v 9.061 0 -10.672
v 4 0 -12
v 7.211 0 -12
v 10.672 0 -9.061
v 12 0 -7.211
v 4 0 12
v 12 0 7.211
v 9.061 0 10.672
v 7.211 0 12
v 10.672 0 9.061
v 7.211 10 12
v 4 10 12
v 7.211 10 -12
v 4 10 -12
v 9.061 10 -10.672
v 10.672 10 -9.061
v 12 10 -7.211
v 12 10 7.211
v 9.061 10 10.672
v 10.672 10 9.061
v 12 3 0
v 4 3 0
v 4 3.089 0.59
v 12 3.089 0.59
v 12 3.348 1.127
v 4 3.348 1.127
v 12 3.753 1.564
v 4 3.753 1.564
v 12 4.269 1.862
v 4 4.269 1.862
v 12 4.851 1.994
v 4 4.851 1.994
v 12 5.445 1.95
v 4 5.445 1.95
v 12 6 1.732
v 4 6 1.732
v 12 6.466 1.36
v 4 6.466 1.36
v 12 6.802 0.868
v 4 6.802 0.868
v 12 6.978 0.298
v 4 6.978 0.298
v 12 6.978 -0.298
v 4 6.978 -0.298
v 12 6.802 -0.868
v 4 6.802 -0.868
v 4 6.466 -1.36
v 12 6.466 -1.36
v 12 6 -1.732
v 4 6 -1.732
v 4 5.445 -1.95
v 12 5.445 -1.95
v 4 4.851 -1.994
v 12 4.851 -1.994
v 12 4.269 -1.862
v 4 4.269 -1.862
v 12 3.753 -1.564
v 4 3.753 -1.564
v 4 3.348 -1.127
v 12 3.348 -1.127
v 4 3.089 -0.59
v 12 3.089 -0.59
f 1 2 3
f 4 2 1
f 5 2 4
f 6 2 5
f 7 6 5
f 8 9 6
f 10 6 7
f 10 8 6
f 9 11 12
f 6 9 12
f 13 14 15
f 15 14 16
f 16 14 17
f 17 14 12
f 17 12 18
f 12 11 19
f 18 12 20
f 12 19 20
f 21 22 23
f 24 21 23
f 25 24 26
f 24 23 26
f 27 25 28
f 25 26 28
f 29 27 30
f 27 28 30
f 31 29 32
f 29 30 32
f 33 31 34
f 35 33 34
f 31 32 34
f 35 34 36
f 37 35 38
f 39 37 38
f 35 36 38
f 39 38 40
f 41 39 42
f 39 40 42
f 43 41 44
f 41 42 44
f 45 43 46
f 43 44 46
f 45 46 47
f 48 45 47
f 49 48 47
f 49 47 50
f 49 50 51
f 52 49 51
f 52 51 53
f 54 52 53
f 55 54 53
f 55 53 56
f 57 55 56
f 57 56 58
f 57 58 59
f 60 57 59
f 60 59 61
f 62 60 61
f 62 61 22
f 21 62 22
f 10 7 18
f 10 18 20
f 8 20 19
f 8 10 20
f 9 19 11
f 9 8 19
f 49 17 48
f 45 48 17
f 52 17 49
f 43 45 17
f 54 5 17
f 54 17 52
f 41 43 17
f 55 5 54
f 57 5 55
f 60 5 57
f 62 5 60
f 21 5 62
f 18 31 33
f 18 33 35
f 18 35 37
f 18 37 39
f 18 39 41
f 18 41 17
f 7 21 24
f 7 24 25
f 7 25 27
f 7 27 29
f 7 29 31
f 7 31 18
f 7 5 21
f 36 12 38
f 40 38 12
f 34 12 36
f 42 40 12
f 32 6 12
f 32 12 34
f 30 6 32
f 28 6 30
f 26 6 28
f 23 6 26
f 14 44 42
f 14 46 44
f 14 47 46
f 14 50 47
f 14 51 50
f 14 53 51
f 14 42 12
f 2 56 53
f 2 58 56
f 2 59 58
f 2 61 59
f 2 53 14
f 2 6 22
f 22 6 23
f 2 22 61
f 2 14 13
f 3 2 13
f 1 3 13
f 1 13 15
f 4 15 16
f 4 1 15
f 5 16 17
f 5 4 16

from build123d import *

# Parameters (mm, degrees)
F1_DEPTH = 10
F2_R     = 2
F3_DEPTH = 25


with BuildPart() as f1:
    # F0 (on Front) → F1 (new body)
    with BuildSketch(Plane.XZ):
        with BuildLine():
            Line((7.211103, 12), (4, 12))
            Line((4, 12), (4, -12))
            Line((4, -12), (7.211103, -12))
            ThreePointArc((7.211103, -12), (9.899495, -9.899495), (12, -7.211103))
            Line((12, -7.211103), (12, 7.211103))
            ThreePointArc((12, 7.211103), (9.899495, 9.899495), (7.211103, 12))
        make_face()
    extrude(amount=-F1_DEPTH)

    # F2 (on face) → F3 (cut)
    with BuildSketch(Plane(origin=(4, 0, 0), x_dir=(0, -1, 0), z_dir=(-1, 0, 0))):
        with Locations((-5, 0)):
            Circle(F2_R)
    extrude(amount=-F3_DEPTH, mode=Mode.SUBTRACT)


solid = f1.part
